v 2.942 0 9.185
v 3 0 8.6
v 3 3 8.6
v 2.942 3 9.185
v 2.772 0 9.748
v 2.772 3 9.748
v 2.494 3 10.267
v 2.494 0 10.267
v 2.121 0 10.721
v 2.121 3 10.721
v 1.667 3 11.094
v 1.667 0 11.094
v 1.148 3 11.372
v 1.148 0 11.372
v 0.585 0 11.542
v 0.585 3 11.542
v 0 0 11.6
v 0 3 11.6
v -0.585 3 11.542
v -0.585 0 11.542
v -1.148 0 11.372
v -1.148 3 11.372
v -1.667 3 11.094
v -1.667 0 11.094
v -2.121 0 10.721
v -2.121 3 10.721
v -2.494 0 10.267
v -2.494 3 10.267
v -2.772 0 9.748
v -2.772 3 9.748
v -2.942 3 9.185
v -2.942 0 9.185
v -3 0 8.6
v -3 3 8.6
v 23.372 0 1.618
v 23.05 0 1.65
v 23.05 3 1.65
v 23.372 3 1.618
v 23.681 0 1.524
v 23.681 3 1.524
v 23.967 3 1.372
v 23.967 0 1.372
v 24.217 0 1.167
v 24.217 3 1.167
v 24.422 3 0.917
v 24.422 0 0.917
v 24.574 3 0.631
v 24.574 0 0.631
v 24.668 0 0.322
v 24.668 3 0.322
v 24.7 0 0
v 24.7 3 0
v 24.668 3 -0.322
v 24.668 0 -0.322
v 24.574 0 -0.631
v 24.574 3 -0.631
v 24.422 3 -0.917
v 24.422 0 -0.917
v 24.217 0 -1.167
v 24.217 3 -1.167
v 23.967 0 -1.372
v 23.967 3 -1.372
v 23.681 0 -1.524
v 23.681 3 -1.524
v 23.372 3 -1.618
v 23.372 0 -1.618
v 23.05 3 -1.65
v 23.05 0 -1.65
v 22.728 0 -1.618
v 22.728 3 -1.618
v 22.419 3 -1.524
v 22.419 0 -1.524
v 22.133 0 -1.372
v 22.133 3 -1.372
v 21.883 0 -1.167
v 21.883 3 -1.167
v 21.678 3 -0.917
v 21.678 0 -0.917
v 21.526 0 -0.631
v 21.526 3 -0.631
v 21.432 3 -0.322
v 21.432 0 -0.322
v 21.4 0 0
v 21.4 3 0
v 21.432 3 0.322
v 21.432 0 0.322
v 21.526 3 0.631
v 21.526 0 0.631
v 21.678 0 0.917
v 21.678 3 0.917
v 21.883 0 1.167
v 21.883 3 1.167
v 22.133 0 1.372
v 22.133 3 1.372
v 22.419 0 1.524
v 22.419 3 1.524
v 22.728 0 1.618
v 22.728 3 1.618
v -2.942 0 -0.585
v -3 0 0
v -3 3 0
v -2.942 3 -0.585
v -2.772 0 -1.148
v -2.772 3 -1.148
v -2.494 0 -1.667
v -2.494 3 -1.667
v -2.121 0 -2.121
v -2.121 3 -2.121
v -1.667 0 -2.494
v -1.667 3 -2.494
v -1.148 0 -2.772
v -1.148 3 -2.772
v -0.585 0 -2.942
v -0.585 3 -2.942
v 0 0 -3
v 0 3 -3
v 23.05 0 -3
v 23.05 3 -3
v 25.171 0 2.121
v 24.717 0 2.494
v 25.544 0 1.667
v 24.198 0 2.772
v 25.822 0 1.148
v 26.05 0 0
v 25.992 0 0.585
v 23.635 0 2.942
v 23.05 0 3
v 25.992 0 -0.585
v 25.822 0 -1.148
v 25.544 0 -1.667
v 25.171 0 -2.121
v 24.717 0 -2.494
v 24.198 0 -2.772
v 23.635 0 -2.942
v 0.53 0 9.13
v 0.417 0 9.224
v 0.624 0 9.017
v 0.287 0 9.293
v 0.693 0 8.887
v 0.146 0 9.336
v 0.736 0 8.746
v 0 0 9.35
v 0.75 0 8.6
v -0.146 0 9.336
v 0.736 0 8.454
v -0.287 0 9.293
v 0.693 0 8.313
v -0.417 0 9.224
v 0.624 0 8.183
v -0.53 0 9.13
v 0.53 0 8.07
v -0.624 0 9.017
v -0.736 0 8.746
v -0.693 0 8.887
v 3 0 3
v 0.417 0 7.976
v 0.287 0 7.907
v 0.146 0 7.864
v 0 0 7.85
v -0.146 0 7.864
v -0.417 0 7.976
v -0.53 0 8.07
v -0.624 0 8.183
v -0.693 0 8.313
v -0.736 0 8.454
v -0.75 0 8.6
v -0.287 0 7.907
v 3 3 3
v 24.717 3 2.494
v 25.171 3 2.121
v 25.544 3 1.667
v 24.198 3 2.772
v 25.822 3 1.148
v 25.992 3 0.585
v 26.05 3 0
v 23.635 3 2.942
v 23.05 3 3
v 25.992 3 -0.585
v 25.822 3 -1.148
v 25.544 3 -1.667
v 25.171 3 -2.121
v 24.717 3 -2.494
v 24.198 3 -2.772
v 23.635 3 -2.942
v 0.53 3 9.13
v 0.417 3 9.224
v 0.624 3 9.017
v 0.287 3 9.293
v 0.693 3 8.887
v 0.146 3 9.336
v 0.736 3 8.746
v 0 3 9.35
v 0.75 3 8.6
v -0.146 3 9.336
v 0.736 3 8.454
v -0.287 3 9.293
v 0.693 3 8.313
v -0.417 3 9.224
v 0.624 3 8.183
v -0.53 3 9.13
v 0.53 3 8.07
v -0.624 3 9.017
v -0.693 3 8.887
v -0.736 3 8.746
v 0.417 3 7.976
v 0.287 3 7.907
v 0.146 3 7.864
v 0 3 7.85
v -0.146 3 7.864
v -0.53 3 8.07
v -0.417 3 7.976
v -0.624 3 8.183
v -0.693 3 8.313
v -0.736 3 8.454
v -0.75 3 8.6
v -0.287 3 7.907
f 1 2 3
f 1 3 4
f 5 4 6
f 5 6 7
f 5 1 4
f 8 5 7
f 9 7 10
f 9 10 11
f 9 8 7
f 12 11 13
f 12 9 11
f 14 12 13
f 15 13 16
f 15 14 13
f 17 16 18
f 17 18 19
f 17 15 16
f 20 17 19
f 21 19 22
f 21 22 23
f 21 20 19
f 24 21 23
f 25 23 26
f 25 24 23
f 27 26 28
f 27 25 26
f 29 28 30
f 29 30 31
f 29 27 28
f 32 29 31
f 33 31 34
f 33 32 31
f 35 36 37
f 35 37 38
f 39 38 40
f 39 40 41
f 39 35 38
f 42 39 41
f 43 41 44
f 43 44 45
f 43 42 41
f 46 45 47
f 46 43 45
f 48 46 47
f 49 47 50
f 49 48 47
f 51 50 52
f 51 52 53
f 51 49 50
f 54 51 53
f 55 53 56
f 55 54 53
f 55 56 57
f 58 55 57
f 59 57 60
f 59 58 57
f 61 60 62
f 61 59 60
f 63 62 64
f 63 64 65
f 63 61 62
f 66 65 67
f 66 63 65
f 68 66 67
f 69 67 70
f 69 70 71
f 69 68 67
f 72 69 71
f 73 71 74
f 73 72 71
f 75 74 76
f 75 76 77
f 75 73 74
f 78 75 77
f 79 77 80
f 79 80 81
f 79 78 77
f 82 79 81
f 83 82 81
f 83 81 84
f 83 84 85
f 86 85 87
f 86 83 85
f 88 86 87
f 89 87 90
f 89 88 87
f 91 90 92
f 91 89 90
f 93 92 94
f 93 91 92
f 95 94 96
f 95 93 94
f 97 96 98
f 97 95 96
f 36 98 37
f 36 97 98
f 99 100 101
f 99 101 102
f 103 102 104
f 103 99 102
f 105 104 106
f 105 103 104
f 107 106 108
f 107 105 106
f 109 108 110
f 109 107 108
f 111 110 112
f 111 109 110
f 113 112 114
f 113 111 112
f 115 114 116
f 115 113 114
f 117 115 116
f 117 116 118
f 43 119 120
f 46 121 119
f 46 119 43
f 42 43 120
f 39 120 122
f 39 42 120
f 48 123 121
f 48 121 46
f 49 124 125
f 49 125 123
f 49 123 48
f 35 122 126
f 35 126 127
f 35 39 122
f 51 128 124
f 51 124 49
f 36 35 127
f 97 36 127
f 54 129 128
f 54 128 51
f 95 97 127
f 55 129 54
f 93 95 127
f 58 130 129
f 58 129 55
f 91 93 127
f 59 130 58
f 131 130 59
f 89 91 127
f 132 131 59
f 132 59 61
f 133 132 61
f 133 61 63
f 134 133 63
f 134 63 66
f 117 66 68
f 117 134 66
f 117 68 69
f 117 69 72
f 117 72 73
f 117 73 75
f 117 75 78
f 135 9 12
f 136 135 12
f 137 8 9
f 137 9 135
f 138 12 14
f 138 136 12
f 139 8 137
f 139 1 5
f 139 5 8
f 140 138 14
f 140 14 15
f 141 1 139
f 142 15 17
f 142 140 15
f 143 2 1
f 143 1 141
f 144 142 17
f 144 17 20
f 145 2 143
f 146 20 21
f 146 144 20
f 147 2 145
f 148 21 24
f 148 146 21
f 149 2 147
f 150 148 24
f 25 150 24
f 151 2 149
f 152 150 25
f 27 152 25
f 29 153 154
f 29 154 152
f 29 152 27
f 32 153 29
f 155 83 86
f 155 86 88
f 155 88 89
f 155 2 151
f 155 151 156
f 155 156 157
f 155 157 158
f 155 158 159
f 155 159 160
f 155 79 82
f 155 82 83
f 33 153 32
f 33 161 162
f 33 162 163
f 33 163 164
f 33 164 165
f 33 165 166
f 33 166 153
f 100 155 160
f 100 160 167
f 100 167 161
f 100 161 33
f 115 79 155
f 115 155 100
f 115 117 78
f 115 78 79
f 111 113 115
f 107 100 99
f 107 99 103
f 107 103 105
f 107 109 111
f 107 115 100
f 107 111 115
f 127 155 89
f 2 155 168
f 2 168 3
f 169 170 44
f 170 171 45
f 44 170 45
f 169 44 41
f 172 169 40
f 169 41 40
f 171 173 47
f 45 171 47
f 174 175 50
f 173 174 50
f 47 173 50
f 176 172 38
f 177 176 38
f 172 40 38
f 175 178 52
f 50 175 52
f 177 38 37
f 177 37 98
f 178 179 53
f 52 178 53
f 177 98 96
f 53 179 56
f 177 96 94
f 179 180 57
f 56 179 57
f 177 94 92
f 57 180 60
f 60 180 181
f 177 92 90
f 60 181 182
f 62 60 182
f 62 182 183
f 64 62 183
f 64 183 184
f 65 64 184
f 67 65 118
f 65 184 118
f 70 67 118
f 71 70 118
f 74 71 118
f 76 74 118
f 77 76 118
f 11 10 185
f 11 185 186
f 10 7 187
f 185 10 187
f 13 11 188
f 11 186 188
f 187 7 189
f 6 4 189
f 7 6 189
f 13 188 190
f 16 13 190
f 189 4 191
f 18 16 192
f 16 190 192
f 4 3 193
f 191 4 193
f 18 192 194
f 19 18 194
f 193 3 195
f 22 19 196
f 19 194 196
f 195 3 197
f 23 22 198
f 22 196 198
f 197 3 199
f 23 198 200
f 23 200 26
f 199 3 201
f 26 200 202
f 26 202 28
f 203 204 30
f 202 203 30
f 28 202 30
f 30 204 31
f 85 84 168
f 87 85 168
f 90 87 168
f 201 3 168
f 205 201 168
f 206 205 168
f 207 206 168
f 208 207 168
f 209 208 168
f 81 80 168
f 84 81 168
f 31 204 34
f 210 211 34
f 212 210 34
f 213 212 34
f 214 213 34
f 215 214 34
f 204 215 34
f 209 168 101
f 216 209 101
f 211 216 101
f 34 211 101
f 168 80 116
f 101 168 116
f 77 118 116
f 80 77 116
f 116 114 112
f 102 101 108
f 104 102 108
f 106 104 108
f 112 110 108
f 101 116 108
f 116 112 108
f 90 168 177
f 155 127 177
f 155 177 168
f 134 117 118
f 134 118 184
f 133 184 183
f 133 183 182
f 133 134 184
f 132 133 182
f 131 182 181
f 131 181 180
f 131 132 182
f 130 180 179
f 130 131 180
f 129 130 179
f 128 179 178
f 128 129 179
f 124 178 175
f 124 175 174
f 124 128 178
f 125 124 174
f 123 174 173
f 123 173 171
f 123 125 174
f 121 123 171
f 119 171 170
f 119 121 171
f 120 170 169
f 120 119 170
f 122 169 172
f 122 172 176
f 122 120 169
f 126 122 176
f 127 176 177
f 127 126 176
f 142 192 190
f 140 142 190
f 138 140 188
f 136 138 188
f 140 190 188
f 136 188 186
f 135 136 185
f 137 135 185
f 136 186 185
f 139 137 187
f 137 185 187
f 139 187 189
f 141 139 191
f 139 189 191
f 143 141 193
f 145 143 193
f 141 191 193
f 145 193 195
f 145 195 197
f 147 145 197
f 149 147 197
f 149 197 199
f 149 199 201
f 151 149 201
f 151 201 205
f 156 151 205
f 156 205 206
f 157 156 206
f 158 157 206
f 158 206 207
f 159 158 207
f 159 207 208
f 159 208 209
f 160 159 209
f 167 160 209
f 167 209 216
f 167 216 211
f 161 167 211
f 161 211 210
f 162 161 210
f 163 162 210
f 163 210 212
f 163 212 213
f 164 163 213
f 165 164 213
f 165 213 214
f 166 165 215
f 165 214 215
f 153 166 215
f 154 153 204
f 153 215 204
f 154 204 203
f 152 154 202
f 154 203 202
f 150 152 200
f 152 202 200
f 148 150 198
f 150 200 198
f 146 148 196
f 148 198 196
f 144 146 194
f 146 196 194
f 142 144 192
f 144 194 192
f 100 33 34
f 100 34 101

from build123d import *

# Parameters (mm, degrees)
SKETCH_1_R          = 1.65
EXTRUDE_1_DEPTH     = 3
EXTRUDE_2_DEPTH     = 3
CUT_EXTRUDE_1_REACH = 30.673
SKETCH_3_R          = 0.75


with BuildPart() as part:
    # 草图1 → 凸台-拉伸1 (new body)
    with BuildSketch(Plane(origin=(0, 0, 0), x_dir=(1, 0, 0), z_dir=(0, 1, 0))):
        with BuildLine():
            Line((0, 3), (23.05, 3))
            ThreePointArc((23.05, 3), (26.05, 0), (23.05, -3))
            Line((23.05, -3), (0, -3))
            ThreePointArc((0, -3), (-3, 0), (0, 3))
        make_face()
        with Locations(Location((23.05, 0, 0), (0, 0, 270))):
            Circle(SKETCH_1_R, mode=Mode.SUBTRACT)
    extrude(amount=EXTRUDE_1_DEPTH)

    # 草图2 → 凸台-拉伸2 (add)
    with BuildSketch(Plane(origin=(0, 0, 0), x_dir=(1, 0, 0), z_dir=(0, 1, 0))):
        with BuildLine():
            Line((3, 0), (3, -8.6))
            ThreePointArc((3, -8.6), (0, -11.6), (-3, -8.6))
            Line((-3, -8.6), (-3, 0))
            ThreePointArc((-3, 0), (0, 3), (3, 0))
        make_face()
    extrude(amount=EXTRUDE_2_DEPTH)

    # 草图3 → 切除-拉伸1 (cut, up to next)
    with BuildSketch(Plane(origin=(0, 3, 0), x_dir=(1, 0, 0), z_dir=(0, 1, 0)), mode=Mode.PRIVATE) as cut_extrude_1_sk1:
        with Locations(Location((0, -8.6, 0), (0, 0, 270))):
            Circle(SKETCH_3_R)
    cut_extrude_1_tool1 = extrude(cut_extrude_1_sk1.sketch, amount=-CUT_EXTRUDE_1_REACH, mode=Mode.PRIVATE) & part.part
    add(cut_extrude_1_tool1.solids().sort_by_distance((0, 3, 8.6))[0], mode=Mode.SUBTRACT)


solid = part.part
